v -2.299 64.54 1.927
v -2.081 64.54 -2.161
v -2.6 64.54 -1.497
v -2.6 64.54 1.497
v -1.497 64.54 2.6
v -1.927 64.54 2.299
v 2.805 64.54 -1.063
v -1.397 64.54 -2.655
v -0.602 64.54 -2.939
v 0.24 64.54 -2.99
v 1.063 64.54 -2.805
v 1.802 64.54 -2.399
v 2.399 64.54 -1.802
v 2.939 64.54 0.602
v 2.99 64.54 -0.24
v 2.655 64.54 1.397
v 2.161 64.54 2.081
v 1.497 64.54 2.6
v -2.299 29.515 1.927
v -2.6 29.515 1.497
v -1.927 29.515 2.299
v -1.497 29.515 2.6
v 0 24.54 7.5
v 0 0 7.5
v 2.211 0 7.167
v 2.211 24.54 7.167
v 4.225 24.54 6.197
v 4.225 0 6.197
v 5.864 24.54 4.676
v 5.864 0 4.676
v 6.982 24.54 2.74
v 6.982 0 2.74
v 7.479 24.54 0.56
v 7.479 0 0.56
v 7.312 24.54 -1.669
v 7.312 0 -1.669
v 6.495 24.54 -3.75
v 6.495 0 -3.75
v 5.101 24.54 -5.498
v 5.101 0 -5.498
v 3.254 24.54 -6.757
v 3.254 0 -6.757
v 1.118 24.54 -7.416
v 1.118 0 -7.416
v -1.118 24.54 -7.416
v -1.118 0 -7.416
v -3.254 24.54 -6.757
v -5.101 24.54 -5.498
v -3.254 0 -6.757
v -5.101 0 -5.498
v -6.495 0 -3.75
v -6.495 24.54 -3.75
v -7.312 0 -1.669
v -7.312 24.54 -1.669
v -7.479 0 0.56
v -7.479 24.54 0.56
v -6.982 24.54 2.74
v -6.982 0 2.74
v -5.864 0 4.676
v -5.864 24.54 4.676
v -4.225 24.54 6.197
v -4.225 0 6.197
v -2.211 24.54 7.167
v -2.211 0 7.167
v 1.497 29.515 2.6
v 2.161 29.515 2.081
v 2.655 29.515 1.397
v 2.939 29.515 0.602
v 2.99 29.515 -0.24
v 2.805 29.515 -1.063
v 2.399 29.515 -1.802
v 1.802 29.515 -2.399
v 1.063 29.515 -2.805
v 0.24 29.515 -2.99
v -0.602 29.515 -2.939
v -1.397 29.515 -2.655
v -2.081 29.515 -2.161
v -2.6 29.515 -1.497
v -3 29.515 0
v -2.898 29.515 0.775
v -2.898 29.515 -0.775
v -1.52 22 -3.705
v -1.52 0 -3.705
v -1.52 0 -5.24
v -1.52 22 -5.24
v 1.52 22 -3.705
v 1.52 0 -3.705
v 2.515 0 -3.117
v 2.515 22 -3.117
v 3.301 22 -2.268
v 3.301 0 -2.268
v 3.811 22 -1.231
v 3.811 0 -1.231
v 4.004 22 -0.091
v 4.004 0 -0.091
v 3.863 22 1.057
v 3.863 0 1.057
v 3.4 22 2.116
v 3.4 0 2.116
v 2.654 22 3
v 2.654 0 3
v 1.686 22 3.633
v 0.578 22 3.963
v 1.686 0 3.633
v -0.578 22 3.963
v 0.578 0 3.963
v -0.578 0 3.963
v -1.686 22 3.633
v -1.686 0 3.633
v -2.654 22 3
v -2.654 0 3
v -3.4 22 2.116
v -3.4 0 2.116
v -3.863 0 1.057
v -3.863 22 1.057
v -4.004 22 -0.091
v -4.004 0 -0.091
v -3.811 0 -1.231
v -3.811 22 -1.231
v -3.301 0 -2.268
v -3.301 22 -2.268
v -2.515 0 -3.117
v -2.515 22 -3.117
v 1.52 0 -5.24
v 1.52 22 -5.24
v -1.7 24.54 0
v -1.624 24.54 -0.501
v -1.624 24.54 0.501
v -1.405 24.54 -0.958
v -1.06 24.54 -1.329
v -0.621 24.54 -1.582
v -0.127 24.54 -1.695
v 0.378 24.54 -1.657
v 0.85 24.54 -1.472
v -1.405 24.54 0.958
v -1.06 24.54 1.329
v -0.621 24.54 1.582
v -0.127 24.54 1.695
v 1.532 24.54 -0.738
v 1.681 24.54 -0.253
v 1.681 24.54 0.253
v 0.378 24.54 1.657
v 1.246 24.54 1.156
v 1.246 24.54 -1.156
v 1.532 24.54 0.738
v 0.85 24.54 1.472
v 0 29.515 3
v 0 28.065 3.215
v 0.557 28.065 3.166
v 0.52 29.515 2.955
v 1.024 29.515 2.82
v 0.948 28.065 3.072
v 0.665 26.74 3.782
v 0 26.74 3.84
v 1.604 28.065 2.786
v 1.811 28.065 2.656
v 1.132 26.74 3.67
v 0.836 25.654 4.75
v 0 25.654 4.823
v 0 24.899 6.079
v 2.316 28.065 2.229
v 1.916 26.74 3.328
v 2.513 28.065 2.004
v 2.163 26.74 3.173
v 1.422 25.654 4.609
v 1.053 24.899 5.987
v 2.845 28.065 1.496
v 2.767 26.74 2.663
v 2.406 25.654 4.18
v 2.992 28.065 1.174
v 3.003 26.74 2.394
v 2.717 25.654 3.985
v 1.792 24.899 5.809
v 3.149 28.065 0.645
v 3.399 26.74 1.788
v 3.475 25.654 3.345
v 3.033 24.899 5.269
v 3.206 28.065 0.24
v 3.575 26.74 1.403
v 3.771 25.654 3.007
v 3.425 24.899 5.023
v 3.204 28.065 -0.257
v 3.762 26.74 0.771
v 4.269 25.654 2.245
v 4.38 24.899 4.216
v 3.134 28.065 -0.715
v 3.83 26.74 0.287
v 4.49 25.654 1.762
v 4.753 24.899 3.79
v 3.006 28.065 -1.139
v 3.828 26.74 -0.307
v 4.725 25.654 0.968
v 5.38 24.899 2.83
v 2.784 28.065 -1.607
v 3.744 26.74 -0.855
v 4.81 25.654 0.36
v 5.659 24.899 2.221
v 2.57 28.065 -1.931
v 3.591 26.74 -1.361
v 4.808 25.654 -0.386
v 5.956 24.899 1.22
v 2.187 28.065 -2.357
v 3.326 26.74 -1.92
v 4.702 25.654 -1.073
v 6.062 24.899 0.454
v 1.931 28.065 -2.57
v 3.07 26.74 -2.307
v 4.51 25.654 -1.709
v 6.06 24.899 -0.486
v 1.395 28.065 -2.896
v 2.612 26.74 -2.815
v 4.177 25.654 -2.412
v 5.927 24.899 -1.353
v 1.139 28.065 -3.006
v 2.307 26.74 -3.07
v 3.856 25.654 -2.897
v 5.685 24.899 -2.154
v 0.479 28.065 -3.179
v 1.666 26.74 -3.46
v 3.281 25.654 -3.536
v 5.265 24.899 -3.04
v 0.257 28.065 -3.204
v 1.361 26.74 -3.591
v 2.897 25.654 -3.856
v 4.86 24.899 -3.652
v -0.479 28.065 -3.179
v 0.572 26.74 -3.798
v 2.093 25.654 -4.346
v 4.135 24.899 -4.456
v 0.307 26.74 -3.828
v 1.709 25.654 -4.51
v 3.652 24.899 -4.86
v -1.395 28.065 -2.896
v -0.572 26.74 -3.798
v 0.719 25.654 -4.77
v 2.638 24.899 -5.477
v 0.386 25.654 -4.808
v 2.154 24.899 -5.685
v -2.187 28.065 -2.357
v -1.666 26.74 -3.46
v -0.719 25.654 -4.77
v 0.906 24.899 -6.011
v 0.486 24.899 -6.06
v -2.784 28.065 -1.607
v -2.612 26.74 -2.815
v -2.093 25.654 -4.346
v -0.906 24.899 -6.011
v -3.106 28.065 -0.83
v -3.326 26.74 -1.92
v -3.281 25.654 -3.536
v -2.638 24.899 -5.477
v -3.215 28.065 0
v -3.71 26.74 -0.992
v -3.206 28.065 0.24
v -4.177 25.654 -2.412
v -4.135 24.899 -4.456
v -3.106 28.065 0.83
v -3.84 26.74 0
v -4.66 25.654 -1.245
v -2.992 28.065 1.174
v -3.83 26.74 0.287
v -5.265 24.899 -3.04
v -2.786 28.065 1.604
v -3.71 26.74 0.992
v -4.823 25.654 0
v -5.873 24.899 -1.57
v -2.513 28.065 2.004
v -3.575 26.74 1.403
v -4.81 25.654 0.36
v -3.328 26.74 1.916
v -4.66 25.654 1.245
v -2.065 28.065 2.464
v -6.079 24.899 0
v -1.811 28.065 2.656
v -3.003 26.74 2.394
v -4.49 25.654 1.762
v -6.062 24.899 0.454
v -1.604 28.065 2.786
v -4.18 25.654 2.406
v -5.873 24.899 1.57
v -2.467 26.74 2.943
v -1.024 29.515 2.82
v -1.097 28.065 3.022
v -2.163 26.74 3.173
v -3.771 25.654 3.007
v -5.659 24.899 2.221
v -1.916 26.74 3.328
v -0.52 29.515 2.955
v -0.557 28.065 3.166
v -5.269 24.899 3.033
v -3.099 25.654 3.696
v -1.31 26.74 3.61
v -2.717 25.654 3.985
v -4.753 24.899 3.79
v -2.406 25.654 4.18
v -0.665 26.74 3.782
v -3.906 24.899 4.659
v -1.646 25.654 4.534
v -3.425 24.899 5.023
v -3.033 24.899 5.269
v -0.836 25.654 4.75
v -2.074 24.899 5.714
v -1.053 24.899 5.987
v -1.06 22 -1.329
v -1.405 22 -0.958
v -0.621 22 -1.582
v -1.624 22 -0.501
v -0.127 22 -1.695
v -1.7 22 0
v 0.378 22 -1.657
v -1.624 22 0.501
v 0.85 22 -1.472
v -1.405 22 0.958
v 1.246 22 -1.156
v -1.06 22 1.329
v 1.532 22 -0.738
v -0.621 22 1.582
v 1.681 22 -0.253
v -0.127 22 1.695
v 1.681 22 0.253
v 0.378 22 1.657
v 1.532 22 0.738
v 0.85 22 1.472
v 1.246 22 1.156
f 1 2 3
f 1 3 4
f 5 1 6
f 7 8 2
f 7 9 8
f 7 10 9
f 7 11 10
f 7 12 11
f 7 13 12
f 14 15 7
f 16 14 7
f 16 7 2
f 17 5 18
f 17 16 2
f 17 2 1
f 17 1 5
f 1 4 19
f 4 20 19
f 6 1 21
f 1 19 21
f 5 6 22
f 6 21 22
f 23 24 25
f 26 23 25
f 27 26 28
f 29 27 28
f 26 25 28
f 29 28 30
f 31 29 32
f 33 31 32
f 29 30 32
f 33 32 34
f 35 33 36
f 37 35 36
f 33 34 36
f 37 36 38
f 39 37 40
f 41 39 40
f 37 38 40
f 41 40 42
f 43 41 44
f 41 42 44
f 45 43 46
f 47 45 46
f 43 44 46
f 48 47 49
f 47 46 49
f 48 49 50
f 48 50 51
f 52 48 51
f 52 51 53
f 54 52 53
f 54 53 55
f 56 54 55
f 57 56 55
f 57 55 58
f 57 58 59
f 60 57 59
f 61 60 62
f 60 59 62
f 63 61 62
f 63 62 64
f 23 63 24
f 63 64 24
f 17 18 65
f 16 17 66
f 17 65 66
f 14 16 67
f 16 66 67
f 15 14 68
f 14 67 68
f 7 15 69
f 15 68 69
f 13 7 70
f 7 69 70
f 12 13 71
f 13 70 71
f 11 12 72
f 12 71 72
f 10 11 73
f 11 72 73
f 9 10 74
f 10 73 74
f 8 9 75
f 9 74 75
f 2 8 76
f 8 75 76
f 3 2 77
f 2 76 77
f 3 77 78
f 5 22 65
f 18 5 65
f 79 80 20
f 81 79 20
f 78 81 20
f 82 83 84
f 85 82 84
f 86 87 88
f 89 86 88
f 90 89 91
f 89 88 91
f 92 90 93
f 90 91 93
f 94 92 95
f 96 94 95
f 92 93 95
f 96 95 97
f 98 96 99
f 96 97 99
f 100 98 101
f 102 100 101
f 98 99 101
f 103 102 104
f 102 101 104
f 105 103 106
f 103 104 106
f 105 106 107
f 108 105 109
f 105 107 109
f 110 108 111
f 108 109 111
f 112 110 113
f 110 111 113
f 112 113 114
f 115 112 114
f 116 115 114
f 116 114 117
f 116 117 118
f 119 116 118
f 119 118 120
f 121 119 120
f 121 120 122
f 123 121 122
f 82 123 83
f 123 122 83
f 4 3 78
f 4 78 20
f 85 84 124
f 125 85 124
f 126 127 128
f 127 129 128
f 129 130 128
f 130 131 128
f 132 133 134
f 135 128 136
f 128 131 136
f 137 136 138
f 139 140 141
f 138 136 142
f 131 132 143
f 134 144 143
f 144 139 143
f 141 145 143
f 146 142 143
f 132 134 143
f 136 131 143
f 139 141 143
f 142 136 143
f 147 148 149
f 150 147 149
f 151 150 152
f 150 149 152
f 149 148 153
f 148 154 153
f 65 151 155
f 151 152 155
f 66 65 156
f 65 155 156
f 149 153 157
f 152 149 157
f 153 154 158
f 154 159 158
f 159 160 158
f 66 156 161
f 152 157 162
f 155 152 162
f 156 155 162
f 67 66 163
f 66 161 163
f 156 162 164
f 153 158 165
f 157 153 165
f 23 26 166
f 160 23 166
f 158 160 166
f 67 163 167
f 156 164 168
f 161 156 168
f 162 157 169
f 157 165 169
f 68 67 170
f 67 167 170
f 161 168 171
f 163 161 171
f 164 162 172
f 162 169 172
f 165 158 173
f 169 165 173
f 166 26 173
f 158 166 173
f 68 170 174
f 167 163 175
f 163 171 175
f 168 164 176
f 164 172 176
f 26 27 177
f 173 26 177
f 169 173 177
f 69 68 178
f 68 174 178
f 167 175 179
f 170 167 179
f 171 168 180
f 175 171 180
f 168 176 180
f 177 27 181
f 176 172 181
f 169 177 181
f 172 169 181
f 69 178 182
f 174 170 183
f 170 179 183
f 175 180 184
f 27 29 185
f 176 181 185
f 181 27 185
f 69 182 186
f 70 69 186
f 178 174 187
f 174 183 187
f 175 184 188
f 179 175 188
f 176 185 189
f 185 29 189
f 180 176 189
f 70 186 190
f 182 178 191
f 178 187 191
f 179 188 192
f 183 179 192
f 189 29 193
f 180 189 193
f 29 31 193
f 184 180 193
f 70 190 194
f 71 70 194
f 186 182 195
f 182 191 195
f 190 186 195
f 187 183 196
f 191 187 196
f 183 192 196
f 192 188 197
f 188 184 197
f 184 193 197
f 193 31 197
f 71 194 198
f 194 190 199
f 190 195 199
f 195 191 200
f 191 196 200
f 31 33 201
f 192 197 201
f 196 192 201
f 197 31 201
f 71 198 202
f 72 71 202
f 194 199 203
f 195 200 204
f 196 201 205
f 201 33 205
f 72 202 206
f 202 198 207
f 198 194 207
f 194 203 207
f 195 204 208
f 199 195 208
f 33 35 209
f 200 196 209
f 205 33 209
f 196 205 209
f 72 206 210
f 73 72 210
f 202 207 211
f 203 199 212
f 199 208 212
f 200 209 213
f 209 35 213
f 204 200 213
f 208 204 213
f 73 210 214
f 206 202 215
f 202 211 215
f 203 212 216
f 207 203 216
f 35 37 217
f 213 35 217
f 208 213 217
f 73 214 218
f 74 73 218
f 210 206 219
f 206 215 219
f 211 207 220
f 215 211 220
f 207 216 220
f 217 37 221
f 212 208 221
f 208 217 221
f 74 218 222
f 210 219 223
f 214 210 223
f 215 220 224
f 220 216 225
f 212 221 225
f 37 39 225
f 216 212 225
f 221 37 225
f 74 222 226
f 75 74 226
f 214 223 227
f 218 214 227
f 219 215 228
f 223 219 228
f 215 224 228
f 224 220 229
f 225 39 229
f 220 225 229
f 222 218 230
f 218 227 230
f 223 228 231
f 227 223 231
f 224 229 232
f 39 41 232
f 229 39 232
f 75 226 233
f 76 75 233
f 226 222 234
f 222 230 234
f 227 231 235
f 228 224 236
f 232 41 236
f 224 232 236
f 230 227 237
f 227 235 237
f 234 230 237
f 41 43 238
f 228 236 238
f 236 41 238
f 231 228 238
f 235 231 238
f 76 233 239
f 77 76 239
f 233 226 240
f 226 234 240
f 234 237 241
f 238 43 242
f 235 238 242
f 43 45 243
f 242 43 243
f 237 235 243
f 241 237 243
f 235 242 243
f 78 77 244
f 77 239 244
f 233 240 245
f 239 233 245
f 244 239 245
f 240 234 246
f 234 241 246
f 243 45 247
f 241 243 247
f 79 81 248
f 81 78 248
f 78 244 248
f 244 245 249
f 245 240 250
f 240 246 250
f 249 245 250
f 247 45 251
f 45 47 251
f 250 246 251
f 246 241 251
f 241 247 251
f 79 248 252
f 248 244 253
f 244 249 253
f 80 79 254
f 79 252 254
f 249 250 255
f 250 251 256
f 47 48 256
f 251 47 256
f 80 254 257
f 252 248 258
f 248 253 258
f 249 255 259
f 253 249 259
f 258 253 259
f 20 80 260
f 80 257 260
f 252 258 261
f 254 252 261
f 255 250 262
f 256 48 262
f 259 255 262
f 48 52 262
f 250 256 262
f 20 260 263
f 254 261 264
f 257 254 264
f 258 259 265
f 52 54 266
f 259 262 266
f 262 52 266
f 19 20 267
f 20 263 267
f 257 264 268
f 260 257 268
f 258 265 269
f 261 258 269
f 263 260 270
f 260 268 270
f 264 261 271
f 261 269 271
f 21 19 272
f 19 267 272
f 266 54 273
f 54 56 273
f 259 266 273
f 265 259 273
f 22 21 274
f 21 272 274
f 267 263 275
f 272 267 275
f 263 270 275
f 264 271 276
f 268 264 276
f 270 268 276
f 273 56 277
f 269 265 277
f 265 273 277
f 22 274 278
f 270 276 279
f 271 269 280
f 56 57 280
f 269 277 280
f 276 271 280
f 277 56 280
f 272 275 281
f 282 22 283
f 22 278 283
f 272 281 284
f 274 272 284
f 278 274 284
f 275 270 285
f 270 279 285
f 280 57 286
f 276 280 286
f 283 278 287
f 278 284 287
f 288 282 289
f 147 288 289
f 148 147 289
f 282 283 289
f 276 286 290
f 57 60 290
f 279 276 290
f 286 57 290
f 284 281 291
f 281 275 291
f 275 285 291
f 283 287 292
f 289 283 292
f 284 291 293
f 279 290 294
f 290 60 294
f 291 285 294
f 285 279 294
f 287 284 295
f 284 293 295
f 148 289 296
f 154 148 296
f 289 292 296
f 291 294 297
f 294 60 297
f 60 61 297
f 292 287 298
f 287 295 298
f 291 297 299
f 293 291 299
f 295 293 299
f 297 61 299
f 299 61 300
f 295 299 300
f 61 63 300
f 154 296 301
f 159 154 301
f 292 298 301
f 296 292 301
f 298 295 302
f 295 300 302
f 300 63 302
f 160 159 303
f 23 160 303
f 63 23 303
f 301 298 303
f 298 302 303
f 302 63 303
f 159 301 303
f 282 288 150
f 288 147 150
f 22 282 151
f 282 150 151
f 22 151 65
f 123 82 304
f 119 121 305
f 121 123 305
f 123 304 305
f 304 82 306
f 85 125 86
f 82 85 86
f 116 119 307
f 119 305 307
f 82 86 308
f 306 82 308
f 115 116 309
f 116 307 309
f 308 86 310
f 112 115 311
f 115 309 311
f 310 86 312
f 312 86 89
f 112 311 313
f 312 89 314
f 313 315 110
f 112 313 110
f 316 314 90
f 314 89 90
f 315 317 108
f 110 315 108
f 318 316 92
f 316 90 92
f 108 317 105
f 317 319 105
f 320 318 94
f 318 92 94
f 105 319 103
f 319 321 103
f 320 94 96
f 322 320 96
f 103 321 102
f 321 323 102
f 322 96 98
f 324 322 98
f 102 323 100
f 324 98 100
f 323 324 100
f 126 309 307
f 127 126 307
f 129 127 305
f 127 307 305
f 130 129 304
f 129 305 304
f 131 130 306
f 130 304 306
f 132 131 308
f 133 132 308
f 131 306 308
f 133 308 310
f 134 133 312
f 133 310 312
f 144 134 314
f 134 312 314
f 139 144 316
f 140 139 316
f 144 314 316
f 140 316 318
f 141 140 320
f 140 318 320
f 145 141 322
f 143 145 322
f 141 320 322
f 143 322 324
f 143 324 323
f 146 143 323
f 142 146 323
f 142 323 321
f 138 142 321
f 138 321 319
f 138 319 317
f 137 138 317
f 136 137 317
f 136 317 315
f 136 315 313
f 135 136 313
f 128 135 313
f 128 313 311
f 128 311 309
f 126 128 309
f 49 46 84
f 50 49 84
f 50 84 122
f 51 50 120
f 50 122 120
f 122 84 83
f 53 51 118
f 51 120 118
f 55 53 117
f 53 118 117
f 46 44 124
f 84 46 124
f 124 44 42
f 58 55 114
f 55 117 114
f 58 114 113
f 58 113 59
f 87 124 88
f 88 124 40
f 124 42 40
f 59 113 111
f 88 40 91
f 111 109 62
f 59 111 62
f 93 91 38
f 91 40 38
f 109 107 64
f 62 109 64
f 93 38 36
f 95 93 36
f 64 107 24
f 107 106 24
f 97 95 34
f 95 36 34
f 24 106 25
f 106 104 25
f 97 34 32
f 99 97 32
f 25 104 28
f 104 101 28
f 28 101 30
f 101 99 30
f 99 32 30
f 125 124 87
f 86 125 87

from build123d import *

# Parameters (mm, degrees)
SKETCH1_R            = 7.5
BOSS_EXTRUDE1_DEPTH  = 22
SKETCH3_R            = 7.5
BOSS_EXTRUDE2_DEPTH  = 2.54
M3_CLEARANCE_HOLE1_D = 3.4
SKETCH4_R            = 3
BOSS_EXTRUDE4_DEPTH  = 40
FILLET1_R            = 5
SKETCH12_W           = 15.000000000000002
SKETCH12_H           = 35.32384224330768
CUT_EXTRUDE1_DEPTH   = 0.4
CIRPATTERN2_COUNT    = 2
CIRPATTERN2_ANGLE    = 90.0000000000002


with BuildPart() as part:
    # Sketch1 → Boss-Extrude1 (new body)
    with BuildSketch(Plane(origin=(0, 0, 0), x_dir=(1, 0, 0), z_dir=(0, 1, 0))):
        with Locations(Location((0, 0, 0), (0, 0, 270))):
            Circle(SKETCH1_R)
        with BuildLine():
            Line((-1.5199999999999996, 3.705350860579872), (-1.52, 5.24))
            Line((-1.52, 5.24), (1.52, 5.24))
            Line((1.52, 5.24), (1.5199999999999996, 3.705350860579872))
            ThreePointArc((1.5199999999999994, 3.7053508605798724), (3.3262309751428867, 2.2307425893634614), (4.005, 0))
            ThreePointArc((4.005, -9.8e-16), (-2.2307425893634596, -3.326230975142888), (-1.5199999999999998, 3.7053508605798724))
        make_face(mode=Mode.SUBTRACT)
    extrude(amount=BOSS_EXTRUDE1_DEPTH)

    # Sketch3 → Boss-Extrude2 (add)
    with BuildSketch(Plane(origin=(0, 22, 0), x_dir=(1, 0, 0), z_dir=(0, 1, 0))):
        with Locations(Location((0, 0, 0), (0, 0, 270))):
            Circle(SKETCH3_R)
    extrude(amount=BOSS_EXTRUDE2_DEPTH)

    # M3 Clearance Hole1 (through all)
    with Locations(Plane(origin=(0, 24.54, 0), x_dir=(1, 0, 0), z_dir=(0, 1, 0))):
        with Locations((0, 0)):
            Hole(M3_CLEARANCE_HOLE1_D / 2)

    # Sketch4 → Boss-Extrude4 (add)
    with BuildSketch(Plane(origin=(0, 24.54, 0), x_dir=(1, 0, 0), z_dir=(0, 1, 0))):
        with Locations(Location((0, 0, 0), (0, 0, 270))):
            Circle(SKETCH4_R)
    extrude(amount=BOSS_EXTRUDE4_DEPTH)

    # Fillet1
    # the kernel refuses this fillet: 5 mm, written as the material it adds along each edge
    with BuildSketch(Plane(origin=(0, 24.54, 0), x_dir=(-1.8e-16, 0, 1), z_dir=(-1, 0, -1.8e-16))) as fillet1_piece_1:
        with BuildLine():
            CenterArc((8, 4.974937185533101), FILLET1_R, 180, 84.26082952273322)
            Line((3, 4.974937185533101), (2.9, 4.974937185533101))
            Line((2.9, 4.974937185533101), (2.9, 0))
            Line((2.9, 0), (3, -0.10000000000000142))
            ThreePointArc((3, -0.10000000000000142), (5.25, -0.10000000000000142), (7.49, -0.09949874371066159))
            Line((7.49, -0.09949874371066159), (7.5, 0))
        make_face()
    revolve(axis=Axis((0, 24.54, 0), (0, 1, 0)))

    # Sketch12 → Cut-Extrude1 (cut)
    with BuildSketch(Plane.ZY.offset(3.0000000000000004)):
        with Locations((0, 47.17685830718694)):
            Rectangle(SKETCH12_W, SKETCH12_H)
    cut_extrude1 = extrude(amount=-CUT_EXTRUDE1_DEPTH, mode=Mode.SUBTRACT)

    # CirPattern2: Cut-Extrude1 ×2 about axis
    cirpattern2_axis = Axis((0, 64.54, 0), (0, 1, 0))
    for i in range(1, CIRPATTERN2_COUNT):
        add(cut_extrude1.rotate(cirpattern2_axis, i * CIRPATTERN2_ANGLE / (CIRPATTERN2_COUNT - 1)), mode=Mode.SUBTRACT)


solid = part.part
